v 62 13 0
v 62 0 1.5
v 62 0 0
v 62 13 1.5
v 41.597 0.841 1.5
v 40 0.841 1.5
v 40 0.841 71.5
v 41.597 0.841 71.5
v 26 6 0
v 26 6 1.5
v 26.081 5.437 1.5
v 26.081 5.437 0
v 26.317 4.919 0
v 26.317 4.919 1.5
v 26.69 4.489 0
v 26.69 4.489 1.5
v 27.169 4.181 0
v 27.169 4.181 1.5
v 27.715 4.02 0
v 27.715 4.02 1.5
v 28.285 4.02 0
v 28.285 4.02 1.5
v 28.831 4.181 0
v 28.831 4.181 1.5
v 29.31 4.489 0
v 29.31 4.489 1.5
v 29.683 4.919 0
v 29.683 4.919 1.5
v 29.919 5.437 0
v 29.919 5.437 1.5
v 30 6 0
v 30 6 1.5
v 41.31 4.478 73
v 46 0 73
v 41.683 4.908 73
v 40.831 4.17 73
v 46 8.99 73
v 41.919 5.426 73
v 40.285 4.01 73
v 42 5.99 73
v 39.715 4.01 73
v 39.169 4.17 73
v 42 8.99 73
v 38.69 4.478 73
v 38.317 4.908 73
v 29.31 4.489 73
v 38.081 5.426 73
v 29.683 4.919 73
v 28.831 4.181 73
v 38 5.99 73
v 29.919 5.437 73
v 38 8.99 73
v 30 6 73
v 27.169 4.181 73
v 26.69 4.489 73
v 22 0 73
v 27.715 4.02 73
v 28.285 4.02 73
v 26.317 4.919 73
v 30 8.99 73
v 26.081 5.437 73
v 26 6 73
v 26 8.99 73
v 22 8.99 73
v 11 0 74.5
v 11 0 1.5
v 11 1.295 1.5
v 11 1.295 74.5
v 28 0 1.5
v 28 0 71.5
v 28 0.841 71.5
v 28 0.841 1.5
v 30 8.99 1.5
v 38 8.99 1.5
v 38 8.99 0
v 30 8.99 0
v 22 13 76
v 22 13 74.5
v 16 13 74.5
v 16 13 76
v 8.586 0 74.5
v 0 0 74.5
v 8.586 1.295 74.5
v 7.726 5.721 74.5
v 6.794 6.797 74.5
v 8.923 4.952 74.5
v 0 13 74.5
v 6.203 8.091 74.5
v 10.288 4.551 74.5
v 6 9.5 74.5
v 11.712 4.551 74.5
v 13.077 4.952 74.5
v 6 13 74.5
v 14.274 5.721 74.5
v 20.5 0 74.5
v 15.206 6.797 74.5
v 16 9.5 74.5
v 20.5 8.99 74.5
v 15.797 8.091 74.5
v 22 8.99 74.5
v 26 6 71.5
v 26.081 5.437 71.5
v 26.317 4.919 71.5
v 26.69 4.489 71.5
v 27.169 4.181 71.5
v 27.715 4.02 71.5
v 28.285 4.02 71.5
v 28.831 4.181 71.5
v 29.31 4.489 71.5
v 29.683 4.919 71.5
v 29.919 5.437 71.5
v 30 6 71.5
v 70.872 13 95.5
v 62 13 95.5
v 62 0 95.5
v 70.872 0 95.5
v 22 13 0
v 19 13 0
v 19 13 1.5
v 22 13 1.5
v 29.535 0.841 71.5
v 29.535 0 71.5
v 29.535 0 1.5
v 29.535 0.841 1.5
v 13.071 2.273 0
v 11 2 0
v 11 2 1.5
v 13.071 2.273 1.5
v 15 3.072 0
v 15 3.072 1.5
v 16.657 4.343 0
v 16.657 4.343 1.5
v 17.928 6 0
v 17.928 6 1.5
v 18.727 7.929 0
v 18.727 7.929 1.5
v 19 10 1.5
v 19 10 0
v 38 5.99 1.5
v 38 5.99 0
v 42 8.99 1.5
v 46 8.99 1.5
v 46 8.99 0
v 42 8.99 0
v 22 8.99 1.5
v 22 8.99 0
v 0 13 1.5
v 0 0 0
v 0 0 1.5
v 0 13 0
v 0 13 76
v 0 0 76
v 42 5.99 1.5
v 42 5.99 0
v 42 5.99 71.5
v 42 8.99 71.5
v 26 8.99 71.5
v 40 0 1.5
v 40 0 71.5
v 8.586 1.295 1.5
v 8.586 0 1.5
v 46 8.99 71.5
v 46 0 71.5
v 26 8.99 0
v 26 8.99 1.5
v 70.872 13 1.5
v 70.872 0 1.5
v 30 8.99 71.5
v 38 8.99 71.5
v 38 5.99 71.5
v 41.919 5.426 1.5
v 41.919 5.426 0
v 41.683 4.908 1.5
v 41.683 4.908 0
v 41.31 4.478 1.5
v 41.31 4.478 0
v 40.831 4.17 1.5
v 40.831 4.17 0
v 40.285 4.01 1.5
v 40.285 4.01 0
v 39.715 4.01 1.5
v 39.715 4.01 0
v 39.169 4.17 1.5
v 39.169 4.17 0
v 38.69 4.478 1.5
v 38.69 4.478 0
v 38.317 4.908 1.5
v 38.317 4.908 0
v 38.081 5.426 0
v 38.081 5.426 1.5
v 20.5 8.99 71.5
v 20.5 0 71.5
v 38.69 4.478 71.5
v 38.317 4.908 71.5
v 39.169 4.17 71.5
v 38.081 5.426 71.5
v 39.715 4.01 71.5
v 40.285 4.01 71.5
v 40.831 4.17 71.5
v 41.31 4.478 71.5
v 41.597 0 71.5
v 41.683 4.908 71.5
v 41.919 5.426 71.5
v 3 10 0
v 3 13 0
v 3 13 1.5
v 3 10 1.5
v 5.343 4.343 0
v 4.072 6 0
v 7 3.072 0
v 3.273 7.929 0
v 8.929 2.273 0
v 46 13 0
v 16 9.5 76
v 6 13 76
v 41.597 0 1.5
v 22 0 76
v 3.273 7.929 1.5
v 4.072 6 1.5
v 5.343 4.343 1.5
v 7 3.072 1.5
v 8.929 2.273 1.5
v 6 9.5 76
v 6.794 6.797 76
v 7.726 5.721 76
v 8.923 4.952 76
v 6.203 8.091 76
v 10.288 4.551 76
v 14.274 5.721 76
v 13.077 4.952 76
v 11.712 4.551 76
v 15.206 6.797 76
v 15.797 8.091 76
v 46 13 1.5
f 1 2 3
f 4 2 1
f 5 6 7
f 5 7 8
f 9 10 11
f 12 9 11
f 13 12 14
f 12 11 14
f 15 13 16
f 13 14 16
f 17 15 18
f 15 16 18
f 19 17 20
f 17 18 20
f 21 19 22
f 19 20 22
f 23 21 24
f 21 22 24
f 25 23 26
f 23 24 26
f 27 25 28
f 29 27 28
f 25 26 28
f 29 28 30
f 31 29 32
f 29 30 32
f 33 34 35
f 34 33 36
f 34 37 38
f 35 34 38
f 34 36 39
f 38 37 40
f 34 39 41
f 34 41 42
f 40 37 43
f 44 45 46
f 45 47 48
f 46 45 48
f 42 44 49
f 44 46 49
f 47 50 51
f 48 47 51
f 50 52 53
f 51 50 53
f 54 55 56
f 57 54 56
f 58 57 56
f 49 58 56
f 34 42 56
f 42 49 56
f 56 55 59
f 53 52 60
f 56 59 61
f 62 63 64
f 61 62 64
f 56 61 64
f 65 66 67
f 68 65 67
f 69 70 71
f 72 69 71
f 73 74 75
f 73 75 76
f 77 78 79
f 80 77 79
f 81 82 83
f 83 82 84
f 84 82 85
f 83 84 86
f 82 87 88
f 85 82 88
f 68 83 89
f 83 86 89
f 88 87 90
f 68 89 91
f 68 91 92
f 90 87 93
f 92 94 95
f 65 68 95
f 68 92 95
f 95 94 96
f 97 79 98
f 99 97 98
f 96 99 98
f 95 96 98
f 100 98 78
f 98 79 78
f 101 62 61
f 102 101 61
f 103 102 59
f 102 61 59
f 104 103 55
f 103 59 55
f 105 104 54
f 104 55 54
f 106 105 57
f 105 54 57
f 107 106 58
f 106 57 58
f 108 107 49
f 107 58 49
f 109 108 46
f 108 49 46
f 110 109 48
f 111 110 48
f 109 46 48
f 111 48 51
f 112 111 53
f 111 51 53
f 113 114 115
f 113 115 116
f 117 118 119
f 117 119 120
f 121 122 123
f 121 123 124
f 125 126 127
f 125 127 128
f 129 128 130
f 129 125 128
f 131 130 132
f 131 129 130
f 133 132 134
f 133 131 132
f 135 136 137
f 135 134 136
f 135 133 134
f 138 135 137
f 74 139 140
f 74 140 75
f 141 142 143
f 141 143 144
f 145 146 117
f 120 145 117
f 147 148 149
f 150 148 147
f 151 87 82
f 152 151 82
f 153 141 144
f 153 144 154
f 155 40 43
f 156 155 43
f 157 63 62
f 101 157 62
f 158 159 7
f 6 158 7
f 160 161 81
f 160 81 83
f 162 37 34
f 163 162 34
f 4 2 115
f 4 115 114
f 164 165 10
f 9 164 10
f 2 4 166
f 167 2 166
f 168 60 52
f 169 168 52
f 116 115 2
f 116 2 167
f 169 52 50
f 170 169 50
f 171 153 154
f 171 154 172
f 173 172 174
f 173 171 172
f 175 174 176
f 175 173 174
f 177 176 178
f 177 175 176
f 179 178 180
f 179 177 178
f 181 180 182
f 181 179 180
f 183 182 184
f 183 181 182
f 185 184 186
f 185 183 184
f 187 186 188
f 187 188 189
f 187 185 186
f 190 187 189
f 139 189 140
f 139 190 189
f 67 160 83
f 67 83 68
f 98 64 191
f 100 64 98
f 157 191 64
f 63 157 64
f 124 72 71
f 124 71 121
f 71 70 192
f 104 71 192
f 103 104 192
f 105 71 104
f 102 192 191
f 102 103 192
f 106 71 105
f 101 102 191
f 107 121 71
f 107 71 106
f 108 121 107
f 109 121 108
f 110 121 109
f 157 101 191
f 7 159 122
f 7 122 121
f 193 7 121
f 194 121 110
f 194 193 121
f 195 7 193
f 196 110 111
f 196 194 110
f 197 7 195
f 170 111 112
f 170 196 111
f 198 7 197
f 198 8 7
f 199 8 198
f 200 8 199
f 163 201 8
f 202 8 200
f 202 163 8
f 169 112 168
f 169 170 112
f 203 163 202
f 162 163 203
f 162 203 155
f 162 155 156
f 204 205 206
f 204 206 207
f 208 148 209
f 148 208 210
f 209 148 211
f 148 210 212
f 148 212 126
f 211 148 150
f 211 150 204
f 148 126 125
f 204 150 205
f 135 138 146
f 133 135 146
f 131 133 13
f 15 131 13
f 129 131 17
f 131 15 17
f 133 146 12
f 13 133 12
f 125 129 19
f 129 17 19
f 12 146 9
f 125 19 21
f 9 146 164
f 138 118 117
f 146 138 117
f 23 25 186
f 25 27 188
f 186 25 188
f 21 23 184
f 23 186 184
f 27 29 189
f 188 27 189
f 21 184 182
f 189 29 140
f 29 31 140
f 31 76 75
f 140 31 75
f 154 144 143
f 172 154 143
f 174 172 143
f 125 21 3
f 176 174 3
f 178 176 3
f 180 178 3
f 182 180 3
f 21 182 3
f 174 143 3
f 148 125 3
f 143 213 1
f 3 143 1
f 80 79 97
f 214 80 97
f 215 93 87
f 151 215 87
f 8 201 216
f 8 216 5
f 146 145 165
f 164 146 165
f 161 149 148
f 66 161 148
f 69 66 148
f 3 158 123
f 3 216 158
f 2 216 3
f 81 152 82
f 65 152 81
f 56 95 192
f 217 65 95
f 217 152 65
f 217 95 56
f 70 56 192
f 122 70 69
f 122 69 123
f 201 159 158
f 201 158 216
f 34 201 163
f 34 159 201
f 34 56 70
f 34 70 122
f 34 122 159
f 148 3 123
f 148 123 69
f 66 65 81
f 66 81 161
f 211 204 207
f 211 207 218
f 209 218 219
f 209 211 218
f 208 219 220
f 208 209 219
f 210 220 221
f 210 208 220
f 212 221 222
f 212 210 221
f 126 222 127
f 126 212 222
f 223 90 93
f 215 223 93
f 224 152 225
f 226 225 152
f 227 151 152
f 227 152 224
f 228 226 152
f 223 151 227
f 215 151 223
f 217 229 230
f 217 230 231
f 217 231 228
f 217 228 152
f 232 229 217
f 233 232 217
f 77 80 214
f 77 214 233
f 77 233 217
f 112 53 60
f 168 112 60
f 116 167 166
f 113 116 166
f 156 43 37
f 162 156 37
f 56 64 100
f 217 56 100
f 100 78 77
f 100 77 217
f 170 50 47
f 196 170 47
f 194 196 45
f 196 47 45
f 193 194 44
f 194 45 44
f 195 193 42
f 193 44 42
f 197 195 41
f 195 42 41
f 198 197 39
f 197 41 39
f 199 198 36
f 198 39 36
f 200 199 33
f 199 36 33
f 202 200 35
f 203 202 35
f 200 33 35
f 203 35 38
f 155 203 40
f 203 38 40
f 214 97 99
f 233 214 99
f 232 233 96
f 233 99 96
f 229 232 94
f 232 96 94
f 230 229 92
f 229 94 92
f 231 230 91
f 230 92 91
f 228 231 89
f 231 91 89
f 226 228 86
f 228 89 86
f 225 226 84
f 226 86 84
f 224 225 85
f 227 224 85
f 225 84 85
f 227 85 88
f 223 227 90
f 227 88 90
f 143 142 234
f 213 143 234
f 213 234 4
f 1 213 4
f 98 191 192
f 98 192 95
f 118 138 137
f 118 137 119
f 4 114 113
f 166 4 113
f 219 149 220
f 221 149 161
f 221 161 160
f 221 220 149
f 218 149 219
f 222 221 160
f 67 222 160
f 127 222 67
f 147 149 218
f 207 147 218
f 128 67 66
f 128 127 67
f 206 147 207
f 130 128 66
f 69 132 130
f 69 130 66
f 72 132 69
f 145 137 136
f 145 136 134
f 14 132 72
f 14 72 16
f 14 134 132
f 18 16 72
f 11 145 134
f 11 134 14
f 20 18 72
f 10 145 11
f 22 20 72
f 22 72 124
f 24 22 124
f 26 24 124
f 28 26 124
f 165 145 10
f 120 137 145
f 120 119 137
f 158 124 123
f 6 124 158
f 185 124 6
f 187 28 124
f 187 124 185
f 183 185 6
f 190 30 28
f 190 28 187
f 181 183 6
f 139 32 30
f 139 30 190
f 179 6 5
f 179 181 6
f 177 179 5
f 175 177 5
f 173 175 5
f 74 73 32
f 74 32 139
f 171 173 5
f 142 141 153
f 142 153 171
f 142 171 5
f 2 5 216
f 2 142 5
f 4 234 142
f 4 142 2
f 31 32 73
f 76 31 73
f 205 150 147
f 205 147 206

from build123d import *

# Parameters (mm, degrees)
CROQUIS1_W                 = 22
CROQUIS1_H                 = 13
SALIENTE_EXTRUIR1_DEPTH    = 1.5
CORTAR_EXTRUIR1_DEPTH      = 26.597851472
CORTAR_EXTRUIR1_DEPTH_BACK = 26.597851472
CROQUIS3_W                 = 2.414138677
CROQUIS3_H                 = 1.29532468
SALIENTE_EXTRUIR2_DEPTH    = 73
SALIENTE_EXTRUIR3_DEPTH    = 1.5
SALIENTE_EXTRUIR4_DEPTH    = 1.5
SALIENTE_EXTRUIR6_DEPTH    = 1.5
CROQUIS11_W                = 1.535403859
CROQUIS11_H                = 0.841260835
CROQUIS11_W_2              = 1.596700718
SALIENTE_EXTRUIR8_DEPTH    = 70
SALIENTE_EXTRUIR9_START    = 1.5
SALIENTE_EXTRUIR9_DEPTH    = 1.5
CROQUIS13_W                = 3
CROQUIS13_H                = 8.989544026
SALIENTE_EXTRUIR10_DEPTH   = 1.5
CROQUIS16_W                = 16
CROQUIS16_H                = 13
SALIENTE_EXTRUIR11_DEPTH   = 1.5
CROQUIS17_W                = 8.872396733
CROQUIS17_H                = 13
SALIENTE_EXTRUIR13_DEPTH   = 94


with BuildPart() as part:
    # Croquis1 → Saliente-Extruir1 (new body)
    with BuildSketch(Plane.XY):
        with Locations((11, 6.5)):
            Rectangle(CROQUIS1_W, CROQUIS1_H)
    extrude(amount=SALIENTE_EXTRUIR1_DEPTH)

    # Croquis2 → Cortar-Extruir1 (cut, two sides: drawn at the far end of the back side and taken through both)
    with BuildSketch(Plane.XY.offset(1.5).offset(-CORTAR_EXTRUIR1_DEPTH_BACK)):
        with BuildLine():
            Line((3, 13), (3, 10))
            ThreePointArc((3, 10), (5.343145751, 4.343145751), (11, 2))
            ThreePointArc((11, 2), (16.656854249, 4.343145751), (19, 10))
            Line((19, 10), (19, 13))
            Line((19, 13), (3, 13))
        make_face()
    extrude(amount=CORTAR_EXTRUIR1_DEPTH + CORTAR_EXTRUIR1_DEPTH_BACK, mode=Mode.SUBTRACT)

    # Croquis3 → Saliente-Extruir2 (add)
    with BuildSketch(Plane.XY.offset(1.5)):
        with Locations((9.792930662, 0.64766234)):
            Rectangle(CROQUIS3_W, CROQUIS3_H)
    extrude(amount=SALIENTE_EXTRUIR2_DEPTH)

    # Croquis5 → Saliente-Extruir3 (add)
    with BuildSketch(Plane.XY.offset(74.5)):
        with BuildLine():
            Line((6, 9.5), (6, 13))
            Line((6, 13), (0, 13))
            Line((0, 13), (0, 0))
            Line((0, 0), (22, 0))
            Line((22, 0), (22, 13))
            Line((22, 13), (16, 13))
            Line((16, 13), (16, 9.5))
            ThreePointArc((16, 9.5), (11, 4.5), (6, 9.5))
        make_face()
    extrude(amount=SALIENTE_EXTRUIR3_DEPTH)

    # Croquis8 → Saliente-Extruir4 (add)
    with BuildSketch(Plane.XY.offset(1.5)):
        with BuildLine():
            Line((34, 0), (22, 0))
            Line((22, 0), (22, 8.989544026))
            Line((22, 8.989544026), (26, 8.989544026))
            Line((26, 8.989544026), (26, 6))
            ThreePointArc((26, 6), (28, 4), (30, 6))
            Line((30, 6), (30, 8.989544026))
            Line((30, 8.989544026), (34, 8.989544026))
            Line((34, 8.989544026), (34, 0))
        make_face()
    extrude(amount=-SALIENTE_EXTRUIR4_DEPTH)

    # Croquis10 → Saliente-Extruir6 (add)
    with BuildSketch(Plane.XY.offset(1.5)):
        with BuildLine():
            Line((38, 5.989544026), (38, 8.989544026))
            Line((38, 8.989544026), (34, 8.989544026))
            Line((34, 8.989544026), (34, 0))
            Line((34, 0), (46, 0))
            Line((46, 0), (46, 8.989544026))
            Line((46, 8.989544026), (42, 8.989544026))
            Line((42, 8.989544026), (42, 5.989544026))
            ThreePointArc((42, 5.989544026), (40, 3.989544026), (38, 5.989544026))
        make_face()
    extrude(amount=-SALIENTE_EXTRUIR6_DEPTH)

    # Croquis11 → Saliente-Extruir8 (add)
    with BuildSketch(Plane.XY.offset(1.5)):
        with Locations((28.767701929, 0.420630418)):
            Rectangle(CROQUIS11_W, CROQUIS11_H)
        with Locations((40.798350359, 0.420630418)):
            Rectangle(CROQUIS11_W_2, CROQUIS11_H)
    extrude(amount=SALIENTE_EXTRUIR8_DEPTH)

    # Croquis12 → Saliente-Extruir9 (add)
    with BuildSketch(Plane.XY.offset(71.5).offset(SALIENTE_EXTRUIR9_START)):
        with BuildLine():
            Line((26, 8.989544026), (26, 6))
            ThreePointArc((26, 6), (28, 4), (30, 6))
            Line((30, 6), (30, 8.989544026))
            Line((30, 8.989544026), (38, 8.989544026))
            Line((38, 8.989544026), (38, 5.989544026))
            ThreePointArc((38, 5.989544026), (40, 3.989544026), (42, 5.989544026))
            Line((42, 5.989544026), (42, 8.989544026))
            Line((42, 8.989544026), (46, 8.989544026))
            Line((46, 8.989544026), (46, 0))
            Line((46, 0), (22, 0))
            Line((22, 0), (22, 8.989544026))
            Line((22, 8.989544026), (26, 8.989544026))
        make_face()
    extrude(amount=-SALIENTE_EXTRUIR9_DEPTH)

    # Croquis13 → Saliente-Extruir10 (add)
    with BuildSketch(Plane.ZY.offset(-22)):
        with Locations((73, 4.494772013)):
            Rectangle(CROQUIS13_W, CROQUIS13_H)
    extrude(amount=SALIENTE_EXTRUIR10_DEPTH)

    # Croquis16 → Saliente-Extruir11 (add)
    with BuildSketch(Plane.XY.offset(1.5)):
        with Locations((54, 6.5)):
            Rectangle(CROQUIS16_W, CROQUIS16_H)
    extrude(amount=-SALIENTE_EXTRUIR11_DEPTH)


with BuildPart() as body_2:
    # Croquis17 → Saliente-Extruir13 (new body)
    with BuildSketch(Plane.XY.offset(1.5)):
        with Locations((66.436198367, 6.5)):
            Rectangle(CROQUIS17_W, CROQUIS17_H)
    extrude(amount=SALIENTE_EXTRUIR13_DEPTH)


solid = Compound([part.part, body_2.part])
